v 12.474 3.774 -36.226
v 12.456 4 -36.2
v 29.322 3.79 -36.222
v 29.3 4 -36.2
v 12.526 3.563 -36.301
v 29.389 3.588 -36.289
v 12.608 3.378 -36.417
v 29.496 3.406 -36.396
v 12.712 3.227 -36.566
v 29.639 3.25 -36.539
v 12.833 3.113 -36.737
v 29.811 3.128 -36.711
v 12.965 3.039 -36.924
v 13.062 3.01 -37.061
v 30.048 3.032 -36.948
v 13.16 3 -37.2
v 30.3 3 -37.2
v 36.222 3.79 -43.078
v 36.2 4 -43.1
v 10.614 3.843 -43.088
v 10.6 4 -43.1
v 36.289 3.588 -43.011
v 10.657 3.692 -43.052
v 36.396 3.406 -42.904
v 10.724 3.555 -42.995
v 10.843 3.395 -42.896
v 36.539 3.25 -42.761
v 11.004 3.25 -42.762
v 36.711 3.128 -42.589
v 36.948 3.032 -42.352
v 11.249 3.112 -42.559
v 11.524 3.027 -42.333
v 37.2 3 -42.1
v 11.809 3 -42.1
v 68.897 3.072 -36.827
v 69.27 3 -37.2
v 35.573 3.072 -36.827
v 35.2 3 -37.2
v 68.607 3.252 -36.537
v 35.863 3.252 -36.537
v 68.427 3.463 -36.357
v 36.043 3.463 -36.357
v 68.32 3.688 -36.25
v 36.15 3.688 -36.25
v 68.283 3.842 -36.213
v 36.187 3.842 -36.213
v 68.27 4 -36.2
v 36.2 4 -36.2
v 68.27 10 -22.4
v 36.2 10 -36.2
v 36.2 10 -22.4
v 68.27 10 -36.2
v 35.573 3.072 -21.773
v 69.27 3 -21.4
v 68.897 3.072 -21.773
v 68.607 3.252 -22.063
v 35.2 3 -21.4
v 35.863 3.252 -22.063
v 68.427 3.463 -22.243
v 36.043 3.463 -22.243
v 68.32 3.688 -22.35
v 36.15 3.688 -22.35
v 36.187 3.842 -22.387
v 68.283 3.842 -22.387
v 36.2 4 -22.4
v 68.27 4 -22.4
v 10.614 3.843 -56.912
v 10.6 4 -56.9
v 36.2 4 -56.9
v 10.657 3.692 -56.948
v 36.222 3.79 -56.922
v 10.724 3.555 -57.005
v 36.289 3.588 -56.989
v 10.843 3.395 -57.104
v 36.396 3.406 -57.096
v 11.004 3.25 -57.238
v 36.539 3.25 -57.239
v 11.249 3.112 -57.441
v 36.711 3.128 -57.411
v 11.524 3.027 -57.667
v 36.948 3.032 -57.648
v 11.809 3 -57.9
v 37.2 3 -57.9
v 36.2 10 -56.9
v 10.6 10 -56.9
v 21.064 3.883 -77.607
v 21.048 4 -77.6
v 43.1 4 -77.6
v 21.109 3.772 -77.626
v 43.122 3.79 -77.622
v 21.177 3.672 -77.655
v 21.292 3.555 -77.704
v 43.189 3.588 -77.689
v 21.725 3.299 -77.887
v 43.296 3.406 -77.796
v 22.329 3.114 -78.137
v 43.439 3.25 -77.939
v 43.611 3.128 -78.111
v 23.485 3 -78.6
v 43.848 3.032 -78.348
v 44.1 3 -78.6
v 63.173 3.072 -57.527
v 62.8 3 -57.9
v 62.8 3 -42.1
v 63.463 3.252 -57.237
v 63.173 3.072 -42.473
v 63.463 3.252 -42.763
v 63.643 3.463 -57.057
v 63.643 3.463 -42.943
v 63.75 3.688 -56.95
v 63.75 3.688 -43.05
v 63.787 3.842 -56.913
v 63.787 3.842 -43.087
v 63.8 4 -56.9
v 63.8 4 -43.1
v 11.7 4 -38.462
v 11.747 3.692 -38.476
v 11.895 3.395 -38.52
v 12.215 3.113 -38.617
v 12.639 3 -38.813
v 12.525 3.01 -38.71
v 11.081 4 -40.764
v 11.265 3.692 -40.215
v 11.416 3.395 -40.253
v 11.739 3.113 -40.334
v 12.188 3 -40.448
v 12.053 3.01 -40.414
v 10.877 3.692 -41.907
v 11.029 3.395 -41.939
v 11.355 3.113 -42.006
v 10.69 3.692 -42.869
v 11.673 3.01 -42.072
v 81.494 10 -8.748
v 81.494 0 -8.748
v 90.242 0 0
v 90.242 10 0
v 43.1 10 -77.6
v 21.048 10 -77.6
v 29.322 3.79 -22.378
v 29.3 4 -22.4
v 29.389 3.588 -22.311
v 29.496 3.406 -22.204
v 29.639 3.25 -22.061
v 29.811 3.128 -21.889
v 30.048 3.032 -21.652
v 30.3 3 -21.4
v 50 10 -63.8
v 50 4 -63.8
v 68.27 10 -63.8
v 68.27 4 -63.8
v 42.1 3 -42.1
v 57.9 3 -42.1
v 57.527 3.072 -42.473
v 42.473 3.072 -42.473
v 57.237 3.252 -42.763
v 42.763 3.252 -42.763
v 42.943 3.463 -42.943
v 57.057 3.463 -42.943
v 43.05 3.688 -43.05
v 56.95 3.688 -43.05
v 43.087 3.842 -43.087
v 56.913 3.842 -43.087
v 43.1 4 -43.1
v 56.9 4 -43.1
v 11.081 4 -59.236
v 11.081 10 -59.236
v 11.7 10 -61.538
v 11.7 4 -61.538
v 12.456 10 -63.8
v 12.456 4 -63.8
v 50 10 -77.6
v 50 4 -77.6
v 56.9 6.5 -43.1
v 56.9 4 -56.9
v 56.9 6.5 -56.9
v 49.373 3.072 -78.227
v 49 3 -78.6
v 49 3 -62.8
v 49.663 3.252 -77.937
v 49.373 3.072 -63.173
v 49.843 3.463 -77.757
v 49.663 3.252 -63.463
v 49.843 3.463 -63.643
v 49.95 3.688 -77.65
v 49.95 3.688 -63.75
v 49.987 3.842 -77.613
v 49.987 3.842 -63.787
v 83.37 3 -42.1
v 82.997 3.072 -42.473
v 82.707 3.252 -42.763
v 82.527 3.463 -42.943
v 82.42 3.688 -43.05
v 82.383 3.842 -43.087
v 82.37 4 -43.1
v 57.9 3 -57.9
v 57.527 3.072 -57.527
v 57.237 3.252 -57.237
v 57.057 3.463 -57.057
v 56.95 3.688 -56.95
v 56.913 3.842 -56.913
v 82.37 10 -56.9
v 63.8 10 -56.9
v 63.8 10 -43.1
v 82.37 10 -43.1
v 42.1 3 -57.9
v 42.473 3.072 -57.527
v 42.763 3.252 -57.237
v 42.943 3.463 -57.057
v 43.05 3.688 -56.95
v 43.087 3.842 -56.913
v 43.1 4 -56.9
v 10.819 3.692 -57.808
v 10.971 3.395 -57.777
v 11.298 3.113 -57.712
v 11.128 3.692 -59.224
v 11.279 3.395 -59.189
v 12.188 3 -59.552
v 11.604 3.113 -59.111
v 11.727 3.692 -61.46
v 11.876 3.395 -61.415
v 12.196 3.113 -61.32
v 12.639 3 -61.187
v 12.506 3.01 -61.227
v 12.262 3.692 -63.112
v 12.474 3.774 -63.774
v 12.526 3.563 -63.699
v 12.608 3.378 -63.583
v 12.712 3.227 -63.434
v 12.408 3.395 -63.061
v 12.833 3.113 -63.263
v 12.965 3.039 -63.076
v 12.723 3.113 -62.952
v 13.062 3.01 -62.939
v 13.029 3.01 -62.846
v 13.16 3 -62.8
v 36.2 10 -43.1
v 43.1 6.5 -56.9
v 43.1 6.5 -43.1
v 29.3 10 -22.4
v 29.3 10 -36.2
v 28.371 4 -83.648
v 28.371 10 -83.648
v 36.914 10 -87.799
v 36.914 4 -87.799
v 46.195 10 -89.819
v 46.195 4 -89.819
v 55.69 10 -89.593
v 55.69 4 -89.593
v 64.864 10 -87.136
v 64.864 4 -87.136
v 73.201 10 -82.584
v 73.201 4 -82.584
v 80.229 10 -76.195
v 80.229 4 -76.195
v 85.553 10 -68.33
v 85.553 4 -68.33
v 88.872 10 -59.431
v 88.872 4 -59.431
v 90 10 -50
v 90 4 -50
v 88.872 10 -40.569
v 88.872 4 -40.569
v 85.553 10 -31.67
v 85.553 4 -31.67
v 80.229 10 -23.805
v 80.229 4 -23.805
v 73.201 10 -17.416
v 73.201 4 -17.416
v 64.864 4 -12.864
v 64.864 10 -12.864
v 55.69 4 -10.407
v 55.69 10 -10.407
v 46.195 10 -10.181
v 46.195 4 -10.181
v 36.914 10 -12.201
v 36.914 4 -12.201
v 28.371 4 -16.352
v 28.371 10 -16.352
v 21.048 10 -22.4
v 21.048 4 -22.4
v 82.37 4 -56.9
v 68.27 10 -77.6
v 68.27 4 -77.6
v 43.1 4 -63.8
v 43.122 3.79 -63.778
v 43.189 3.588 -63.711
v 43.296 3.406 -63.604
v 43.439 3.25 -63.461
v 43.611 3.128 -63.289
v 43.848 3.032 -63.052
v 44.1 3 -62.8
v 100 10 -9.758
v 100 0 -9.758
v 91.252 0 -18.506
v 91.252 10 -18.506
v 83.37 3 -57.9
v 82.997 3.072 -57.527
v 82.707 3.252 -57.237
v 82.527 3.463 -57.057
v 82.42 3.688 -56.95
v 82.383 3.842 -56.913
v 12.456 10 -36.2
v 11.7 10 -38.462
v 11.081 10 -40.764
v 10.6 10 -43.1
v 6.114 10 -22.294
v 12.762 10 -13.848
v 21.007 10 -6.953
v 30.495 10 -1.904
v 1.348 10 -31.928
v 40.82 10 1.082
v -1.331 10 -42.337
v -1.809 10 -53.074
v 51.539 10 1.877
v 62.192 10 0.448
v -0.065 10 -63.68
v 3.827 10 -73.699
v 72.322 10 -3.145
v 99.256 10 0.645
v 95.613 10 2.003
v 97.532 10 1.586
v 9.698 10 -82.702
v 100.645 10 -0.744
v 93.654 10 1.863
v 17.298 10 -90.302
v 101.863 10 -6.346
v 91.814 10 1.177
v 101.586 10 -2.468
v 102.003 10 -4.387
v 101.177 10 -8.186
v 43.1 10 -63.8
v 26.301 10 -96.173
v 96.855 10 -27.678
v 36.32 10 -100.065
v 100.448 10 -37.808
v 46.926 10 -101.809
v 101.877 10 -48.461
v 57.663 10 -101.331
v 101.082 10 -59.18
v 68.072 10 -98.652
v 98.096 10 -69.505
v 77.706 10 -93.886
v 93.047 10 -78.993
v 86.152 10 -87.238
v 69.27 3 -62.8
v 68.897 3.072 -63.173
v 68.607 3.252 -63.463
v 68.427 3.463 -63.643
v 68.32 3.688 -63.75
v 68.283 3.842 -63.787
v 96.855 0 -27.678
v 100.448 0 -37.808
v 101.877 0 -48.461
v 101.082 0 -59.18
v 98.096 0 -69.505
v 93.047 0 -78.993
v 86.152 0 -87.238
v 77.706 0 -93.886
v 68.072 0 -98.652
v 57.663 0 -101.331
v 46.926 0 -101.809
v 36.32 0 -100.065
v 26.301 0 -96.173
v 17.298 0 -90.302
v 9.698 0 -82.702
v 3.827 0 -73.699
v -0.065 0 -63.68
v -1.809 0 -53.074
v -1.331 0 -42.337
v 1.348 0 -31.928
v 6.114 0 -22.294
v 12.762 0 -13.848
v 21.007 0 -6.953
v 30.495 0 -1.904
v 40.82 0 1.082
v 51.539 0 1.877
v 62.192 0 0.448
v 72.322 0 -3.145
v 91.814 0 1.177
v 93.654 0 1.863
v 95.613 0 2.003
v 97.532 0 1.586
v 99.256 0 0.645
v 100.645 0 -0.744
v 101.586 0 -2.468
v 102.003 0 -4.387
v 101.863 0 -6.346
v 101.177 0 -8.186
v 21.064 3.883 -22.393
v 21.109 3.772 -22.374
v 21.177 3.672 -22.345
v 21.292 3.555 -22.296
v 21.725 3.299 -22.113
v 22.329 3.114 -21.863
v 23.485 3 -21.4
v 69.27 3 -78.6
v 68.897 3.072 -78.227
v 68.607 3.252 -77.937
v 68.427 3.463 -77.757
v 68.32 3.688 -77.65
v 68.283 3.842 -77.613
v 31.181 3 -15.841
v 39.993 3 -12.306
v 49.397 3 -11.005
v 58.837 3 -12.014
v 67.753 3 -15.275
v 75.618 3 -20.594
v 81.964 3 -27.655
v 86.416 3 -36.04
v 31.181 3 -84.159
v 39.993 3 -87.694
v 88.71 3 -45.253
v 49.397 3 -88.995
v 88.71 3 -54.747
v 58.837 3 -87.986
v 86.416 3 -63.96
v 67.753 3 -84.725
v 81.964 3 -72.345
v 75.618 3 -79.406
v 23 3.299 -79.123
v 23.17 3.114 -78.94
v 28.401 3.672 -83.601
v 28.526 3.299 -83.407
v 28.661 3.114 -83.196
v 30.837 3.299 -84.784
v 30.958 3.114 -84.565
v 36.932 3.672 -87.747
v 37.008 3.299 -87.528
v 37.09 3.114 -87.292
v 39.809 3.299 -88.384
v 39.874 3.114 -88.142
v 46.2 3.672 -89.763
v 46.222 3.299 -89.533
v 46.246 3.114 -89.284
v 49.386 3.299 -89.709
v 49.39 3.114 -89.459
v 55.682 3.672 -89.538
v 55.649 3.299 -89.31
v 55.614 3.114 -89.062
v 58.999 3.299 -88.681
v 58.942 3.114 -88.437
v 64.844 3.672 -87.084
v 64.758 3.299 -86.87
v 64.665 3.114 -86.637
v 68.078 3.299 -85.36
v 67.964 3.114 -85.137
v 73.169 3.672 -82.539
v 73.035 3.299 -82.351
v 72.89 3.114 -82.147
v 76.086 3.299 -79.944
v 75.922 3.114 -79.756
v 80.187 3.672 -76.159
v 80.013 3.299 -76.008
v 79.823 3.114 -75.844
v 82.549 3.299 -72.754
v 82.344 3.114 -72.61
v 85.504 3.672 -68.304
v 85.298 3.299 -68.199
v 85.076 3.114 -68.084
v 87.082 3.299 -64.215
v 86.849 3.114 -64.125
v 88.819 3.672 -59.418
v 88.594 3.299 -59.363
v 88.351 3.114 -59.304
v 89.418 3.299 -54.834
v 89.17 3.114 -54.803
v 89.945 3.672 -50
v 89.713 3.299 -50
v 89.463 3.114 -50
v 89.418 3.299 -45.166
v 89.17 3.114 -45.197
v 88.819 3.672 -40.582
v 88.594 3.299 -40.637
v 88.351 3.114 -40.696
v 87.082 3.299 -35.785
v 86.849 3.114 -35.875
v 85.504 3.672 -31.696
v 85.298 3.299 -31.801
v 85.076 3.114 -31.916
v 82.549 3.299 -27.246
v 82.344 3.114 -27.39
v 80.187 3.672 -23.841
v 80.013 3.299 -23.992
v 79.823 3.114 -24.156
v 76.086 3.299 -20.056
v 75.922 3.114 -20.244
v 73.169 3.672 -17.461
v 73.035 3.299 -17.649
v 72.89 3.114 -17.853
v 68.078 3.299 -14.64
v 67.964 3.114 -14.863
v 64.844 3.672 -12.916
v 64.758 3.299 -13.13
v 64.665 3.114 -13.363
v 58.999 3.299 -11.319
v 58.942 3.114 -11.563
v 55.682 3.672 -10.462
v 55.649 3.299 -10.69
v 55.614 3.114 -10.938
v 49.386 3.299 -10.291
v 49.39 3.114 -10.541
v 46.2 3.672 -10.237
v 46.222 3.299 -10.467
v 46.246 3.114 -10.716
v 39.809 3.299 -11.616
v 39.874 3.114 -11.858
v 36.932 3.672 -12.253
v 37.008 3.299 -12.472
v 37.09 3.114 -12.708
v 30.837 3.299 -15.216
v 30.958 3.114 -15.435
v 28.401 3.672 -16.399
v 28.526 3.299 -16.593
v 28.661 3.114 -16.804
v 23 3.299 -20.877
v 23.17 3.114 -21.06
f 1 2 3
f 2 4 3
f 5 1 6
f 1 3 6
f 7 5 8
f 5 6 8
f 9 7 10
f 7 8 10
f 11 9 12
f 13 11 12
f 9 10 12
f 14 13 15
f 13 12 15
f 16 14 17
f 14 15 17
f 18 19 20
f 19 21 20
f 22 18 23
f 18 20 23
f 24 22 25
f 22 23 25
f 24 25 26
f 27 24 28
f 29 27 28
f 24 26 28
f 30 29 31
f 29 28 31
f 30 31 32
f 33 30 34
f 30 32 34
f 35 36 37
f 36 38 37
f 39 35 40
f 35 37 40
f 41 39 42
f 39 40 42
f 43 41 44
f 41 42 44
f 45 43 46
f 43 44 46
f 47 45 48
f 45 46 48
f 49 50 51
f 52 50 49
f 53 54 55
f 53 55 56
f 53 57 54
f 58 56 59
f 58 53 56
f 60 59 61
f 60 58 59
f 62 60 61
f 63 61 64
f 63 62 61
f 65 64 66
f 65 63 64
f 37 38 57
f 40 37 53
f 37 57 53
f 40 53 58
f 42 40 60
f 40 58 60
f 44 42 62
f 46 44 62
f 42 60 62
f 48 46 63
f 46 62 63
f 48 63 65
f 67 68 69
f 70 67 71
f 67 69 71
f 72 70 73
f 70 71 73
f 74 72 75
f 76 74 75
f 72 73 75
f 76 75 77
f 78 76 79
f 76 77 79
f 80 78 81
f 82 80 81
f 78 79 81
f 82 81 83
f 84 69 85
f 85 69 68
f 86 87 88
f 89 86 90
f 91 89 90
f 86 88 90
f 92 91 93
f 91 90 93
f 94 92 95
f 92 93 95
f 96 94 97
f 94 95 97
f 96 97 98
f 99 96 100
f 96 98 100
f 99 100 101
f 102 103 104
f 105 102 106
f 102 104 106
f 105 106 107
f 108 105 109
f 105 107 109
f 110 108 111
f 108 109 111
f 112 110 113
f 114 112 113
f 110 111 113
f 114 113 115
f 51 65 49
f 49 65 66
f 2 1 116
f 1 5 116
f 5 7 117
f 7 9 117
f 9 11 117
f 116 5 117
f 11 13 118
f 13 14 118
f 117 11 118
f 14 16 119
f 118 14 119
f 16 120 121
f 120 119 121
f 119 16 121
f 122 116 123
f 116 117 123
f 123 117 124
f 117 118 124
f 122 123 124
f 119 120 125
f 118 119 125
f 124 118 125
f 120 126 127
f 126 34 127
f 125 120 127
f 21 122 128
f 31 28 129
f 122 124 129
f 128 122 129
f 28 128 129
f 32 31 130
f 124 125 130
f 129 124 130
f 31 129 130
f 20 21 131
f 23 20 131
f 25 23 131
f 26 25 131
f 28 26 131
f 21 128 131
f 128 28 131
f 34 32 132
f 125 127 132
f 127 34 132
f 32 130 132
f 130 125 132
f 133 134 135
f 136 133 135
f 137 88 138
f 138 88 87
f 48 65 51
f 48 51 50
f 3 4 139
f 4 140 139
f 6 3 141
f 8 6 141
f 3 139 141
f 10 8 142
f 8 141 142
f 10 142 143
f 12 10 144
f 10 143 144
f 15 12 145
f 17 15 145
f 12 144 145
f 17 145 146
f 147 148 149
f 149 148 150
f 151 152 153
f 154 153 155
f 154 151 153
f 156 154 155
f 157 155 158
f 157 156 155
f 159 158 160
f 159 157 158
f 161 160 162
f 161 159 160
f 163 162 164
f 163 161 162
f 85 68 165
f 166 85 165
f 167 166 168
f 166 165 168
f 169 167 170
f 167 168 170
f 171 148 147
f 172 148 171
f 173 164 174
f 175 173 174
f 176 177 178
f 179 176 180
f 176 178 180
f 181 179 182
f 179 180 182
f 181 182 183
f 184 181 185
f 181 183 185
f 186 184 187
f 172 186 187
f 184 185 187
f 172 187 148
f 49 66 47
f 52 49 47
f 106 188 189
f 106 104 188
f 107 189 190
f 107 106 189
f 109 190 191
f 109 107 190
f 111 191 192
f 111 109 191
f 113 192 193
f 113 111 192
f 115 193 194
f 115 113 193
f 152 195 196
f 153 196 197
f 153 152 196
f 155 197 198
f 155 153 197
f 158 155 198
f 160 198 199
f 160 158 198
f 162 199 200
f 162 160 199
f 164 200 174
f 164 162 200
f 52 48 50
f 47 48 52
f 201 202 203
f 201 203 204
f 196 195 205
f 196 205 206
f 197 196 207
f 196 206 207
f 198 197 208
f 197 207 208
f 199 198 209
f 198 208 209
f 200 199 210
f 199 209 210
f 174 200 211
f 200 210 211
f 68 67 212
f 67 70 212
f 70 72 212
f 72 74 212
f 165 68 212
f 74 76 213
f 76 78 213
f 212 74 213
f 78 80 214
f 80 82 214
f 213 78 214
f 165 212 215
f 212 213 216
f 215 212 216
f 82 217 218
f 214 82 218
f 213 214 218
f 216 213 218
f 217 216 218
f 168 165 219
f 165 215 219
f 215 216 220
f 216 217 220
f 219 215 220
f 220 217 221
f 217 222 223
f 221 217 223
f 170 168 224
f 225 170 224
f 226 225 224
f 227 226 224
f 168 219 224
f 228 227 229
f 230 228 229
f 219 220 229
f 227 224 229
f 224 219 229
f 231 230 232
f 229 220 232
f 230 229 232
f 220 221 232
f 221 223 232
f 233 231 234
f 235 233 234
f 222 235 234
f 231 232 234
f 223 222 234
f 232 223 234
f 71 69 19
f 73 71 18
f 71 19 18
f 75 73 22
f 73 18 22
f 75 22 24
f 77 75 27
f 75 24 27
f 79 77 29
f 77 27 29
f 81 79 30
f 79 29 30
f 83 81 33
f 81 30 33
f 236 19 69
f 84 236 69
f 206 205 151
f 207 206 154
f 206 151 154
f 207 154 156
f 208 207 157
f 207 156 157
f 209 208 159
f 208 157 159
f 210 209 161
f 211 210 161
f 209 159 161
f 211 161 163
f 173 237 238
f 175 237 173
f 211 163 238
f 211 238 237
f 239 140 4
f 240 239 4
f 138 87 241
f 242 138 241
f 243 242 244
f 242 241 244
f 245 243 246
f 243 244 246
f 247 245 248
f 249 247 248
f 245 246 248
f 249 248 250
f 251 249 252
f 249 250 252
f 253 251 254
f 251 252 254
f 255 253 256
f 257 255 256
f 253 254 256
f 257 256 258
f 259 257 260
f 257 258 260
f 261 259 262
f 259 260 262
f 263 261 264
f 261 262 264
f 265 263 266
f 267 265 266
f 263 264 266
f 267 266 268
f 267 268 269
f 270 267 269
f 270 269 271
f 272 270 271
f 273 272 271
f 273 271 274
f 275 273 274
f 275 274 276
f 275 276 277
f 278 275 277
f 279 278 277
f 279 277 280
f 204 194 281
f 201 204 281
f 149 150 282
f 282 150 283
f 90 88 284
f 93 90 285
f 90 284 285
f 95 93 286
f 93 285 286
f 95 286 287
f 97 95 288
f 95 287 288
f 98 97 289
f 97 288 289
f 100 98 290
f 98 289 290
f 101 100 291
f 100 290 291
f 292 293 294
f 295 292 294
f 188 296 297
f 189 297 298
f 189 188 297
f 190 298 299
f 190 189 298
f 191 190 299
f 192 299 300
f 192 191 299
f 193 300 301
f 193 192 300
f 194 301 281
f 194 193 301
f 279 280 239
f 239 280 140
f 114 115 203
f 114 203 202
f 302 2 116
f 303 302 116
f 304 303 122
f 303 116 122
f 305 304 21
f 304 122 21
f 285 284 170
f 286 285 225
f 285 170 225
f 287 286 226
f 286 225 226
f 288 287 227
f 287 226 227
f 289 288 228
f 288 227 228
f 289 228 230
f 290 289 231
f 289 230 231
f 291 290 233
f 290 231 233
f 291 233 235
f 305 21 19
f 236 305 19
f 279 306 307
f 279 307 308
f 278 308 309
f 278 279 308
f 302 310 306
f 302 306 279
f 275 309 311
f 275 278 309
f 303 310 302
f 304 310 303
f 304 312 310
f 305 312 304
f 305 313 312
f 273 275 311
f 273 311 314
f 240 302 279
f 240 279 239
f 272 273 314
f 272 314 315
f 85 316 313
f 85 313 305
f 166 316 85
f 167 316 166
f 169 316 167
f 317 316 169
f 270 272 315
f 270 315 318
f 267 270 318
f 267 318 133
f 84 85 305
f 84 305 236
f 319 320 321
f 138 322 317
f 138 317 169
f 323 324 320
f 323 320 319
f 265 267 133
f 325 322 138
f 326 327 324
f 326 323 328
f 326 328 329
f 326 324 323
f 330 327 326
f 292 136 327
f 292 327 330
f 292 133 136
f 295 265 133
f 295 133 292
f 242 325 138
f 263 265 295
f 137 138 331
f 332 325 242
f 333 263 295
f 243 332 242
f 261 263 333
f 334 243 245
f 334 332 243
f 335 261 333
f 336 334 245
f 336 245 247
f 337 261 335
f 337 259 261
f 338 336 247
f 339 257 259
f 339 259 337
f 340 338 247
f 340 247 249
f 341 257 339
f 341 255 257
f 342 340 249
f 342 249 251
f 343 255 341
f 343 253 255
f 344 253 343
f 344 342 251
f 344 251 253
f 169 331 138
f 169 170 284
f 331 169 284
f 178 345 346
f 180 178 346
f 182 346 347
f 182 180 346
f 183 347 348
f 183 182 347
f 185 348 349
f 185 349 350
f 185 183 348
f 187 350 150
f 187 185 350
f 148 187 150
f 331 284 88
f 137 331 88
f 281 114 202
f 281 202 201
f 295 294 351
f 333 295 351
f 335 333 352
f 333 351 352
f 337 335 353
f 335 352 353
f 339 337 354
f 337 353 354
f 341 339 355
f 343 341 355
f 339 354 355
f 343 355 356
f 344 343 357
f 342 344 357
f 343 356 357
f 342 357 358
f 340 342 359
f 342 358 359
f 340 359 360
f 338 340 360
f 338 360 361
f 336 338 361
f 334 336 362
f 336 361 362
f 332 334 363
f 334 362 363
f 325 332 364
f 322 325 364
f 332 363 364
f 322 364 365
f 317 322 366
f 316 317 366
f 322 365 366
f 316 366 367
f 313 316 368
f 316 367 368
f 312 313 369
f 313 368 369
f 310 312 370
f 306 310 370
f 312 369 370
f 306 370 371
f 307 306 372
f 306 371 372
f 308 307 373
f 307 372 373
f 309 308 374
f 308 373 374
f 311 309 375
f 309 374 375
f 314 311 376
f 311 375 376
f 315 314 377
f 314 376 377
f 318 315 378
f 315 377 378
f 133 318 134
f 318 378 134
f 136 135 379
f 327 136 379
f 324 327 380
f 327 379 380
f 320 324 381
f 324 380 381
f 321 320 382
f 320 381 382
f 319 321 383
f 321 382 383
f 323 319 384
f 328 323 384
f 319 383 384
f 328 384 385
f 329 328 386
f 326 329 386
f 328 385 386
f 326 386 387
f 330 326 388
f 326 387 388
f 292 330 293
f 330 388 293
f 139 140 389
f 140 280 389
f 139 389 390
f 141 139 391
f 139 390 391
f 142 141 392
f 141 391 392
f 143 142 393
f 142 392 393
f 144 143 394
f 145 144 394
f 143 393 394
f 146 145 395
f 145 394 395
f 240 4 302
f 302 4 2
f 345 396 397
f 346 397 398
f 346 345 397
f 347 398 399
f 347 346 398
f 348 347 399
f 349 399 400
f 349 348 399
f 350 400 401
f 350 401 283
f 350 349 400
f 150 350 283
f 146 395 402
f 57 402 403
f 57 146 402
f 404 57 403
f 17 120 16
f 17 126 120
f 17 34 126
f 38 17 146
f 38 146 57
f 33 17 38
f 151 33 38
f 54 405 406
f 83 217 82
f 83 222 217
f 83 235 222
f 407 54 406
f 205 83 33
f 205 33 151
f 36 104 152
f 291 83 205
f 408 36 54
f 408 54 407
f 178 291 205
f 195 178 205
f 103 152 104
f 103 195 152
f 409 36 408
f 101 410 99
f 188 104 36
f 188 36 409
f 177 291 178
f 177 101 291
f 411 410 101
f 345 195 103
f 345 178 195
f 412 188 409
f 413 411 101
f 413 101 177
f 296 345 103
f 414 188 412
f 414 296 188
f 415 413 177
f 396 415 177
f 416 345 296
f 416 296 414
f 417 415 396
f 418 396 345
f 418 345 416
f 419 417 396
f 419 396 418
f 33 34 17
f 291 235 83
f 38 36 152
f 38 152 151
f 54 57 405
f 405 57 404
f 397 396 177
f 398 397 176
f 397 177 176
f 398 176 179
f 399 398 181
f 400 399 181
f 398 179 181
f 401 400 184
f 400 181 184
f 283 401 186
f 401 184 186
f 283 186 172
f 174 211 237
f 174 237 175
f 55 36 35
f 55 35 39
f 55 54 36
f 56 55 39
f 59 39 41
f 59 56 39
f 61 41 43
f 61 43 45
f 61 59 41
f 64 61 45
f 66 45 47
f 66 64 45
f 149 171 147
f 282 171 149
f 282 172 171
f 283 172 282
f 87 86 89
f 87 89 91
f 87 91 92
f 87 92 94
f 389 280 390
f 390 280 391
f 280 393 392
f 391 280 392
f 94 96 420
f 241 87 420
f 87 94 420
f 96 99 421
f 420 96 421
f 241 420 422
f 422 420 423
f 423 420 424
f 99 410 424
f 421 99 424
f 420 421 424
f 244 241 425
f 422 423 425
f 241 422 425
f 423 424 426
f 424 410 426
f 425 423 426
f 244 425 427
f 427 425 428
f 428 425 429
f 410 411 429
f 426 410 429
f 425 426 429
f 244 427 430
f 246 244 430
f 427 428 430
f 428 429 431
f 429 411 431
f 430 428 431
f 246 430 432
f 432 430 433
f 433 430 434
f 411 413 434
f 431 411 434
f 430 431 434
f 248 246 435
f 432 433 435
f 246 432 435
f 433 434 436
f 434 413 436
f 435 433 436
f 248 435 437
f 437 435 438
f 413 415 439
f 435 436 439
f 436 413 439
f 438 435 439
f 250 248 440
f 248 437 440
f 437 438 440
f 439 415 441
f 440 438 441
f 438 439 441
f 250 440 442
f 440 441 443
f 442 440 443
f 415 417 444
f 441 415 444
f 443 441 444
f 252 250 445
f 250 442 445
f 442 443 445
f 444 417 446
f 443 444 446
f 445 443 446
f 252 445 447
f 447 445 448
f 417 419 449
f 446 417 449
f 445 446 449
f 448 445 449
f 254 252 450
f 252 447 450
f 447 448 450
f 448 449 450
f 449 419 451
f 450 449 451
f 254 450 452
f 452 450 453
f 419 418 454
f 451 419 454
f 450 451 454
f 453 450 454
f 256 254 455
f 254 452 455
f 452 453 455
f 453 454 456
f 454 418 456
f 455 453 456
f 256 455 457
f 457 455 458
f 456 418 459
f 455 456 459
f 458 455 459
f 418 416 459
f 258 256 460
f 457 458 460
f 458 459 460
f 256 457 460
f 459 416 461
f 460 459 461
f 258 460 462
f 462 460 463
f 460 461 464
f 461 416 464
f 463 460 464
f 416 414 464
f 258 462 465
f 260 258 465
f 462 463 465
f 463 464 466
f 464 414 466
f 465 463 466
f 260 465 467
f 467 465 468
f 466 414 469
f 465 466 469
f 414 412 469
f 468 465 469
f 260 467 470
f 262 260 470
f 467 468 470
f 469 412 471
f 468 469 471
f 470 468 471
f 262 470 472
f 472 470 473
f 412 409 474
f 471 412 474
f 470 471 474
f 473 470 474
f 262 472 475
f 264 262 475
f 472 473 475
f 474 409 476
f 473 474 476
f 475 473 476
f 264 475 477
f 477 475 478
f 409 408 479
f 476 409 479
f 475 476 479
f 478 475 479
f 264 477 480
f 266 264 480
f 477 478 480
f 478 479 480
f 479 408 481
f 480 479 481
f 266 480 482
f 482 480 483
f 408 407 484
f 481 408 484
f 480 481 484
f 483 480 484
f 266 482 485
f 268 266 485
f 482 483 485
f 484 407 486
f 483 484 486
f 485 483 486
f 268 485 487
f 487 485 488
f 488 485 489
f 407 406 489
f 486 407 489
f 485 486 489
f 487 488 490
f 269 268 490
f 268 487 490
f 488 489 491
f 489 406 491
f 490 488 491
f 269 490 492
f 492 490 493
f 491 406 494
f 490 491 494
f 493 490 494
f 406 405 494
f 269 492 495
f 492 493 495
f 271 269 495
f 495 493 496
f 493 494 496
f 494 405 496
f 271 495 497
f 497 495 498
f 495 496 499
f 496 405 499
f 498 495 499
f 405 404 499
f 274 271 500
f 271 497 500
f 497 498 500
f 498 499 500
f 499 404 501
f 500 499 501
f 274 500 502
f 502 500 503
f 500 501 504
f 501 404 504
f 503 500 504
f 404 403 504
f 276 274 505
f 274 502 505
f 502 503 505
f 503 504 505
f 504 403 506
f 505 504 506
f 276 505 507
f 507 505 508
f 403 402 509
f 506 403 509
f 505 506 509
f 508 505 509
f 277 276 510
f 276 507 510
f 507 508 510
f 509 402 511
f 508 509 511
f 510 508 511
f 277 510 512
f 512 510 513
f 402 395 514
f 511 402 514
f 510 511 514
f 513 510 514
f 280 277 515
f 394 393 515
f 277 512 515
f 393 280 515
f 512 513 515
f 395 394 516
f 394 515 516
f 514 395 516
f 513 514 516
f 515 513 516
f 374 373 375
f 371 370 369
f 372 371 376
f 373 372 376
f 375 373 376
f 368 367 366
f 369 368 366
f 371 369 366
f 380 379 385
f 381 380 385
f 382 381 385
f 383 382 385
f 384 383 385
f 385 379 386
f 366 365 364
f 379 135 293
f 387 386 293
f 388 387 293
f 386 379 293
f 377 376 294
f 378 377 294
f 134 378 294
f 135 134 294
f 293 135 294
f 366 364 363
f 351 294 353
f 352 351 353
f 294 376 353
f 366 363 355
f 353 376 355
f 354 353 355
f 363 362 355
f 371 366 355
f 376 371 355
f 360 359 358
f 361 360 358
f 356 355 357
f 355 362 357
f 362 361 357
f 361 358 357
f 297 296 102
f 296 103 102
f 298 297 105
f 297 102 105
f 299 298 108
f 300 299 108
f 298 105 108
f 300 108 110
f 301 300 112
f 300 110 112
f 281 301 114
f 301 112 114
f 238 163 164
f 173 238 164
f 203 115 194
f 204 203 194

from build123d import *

# Parameters (mm, degrees)
BOSS_EXTRUDE12_DEPTH = 3
SKETCH1_16_W         = 18.27
SKETCH1_16_H         = 13.8
SKETCH1_16_W_2       = 18.57
SKETCH1_16_W_3       = 32.07
BOSS_EXTRUDE13_DEPTH = 10
SKETCH1_17_W         = 13.8
SKETCH1_17_H         = 13.8
BOSS_EXTRUDE14_DEPTH = 6.5
FILLET1_R            = 1


with BuildPart() as part:
    # Sketch1 → Boss-Extrude12 (new body)
    with BuildSketch(Plane(origin=(0, 0, 0), x_dir=(1, 0, 0), z_dir=(0, 1, 0))):
        with BuildLine():
            Line((81.494030169, 8.747896251), (90.24192642, 0))
            ThreePointArc((90.24192642, 0), (100, 0), (100, 9.75807358))
            Line((100, 9.75807358), (91.252103749, 18.505969831))
            ThreePointArc((91.252103749, 18.505969831), (13.301158056, 86.698841944), (81.494030169, 8.747896251))
        make_face()
    extrude(amount=BOSS_EXTRUDE12_DEPTH)

    # Sketch1<16> → Boss-Extrude13 (add)
    # profile 1 of 4: a face of its own
    with BuildSketch(Plane(origin=(0, 0, 0), x_dir=(1, 0, 0), z_dir=(0, 1, 0))):
        with BuildLine():
            Line((81.494030169, 8.747896251), (90.24192642, 0))
            ThreePointArc((90.24192642, 0), (100, 0), (100, 9.75807358))
            Line((100, 9.75807358), (91.252103749, 18.505969831))
            ThreePointArc((91.252103749, 18.505969831), (13.301158056, 86.698841944), (81.494030169, 8.747896251))
        make_face()
        with BuildLine():
            Line((21.047625313, 22.4), (29.3, 22.4))
            Line((29.3, 22.4), (29.3, 36.2))
            Line((29.3, 36.2), (12.455892606, 36.2))
            ThreePointArc((12.455892606, 36.2), (11.37337625, 39.608467983), (10.599619291, 43.1))
            Line((10.599619291, 43.1), (36.2, 43.1))
            Line((36.2, 43.1), (36.2, 56.9))
            Line((36.2, 56.9), (10.599619291, 56.9))
            ThreePointArc((10.599619291, 56.9), (11.37337625, 60.391532017), (12.455892606, 63.8))
            Line((12.455892606, 63.8), (43.1, 63.8))
            Line((43.1, 63.8), (43.1, 77.6))
            Line((43.1, 77.6), (21.047625313, 77.6))
            ThreePointArc((21.047625313, 77.6), (90, 50), (21.047625313, 22.4))
        make_face(mode=Mode.SUBTRACT)
    # profile 2 of 4: a face of its own
    with BuildSketch(Plane(origin=(0, 0, 0), x_dir=(1, 0, 0), z_dir=(0, 1, 0))):
        with Locations((59.135, 70.7)):
            Rectangle(SKETCH1_16_W, SKETCH1_16_H)
    # profile 3 of 4: a face of its own
    with BuildSketch(Plane(origin=(0, 0, 0), x_dir=(1, 0, 0), z_dir=(0, 1, 0))):
        with Locations((73.085, 50)):
            Rectangle(SKETCH1_16_W_2, SKETCH1_16_H)
    # profile 4 of 4: a face of its own
    with BuildSketch(Plane(origin=(0, 0, 0), x_dir=(1, 0, 0), z_dir=(0, 1, 0))):
        with Locations((52.235, 29.3)):
            Rectangle(SKETCH1_16_W_3, SKETCH1_16_H)
    extrude(amount=BOSS_EXTRUDE13_DEPTH)

    # Sketch1<17> → Boss-Extrude14 (add)
    with BuildSketch(Plane(origin=(0, 0, 0), x_dir=(1, 0, 0), z_dir=(0, 1, 0))):
        with Locations((50, 50)):
            Rectangle(SKETCH1_17_W, SKETCH1_17_H)
    extrude(amount=BOSS_EXTRUDE14_DEPTH)

    # Fillet1
    fillet1_edges = [part.edges().sort_by_distance(p)[0] for p in [
        (90, 3, -50),
        (36.2, 3, -29.3),
        (52.235, 3, -22.4),
        (50, 3, -70.7),
        (59.135, 3, -63.8),
        (43.1, 3, -50),
        (50, 3, -43.1),
        (63.8, 3, -50),
        (73.085, 3, -43.1),
        (50, 3, -56.9),
        (73.085, 3, -56.9),
        (56.9, 3, -50),
        (52.235, 3, -36.2),
        (68.27, 3, -29.3),
        (82.37, 3, -50),
        (68.27, 3, -70.7),
        (59.135, 3, -77.6),
        (32.073812657, 3, -77.6),
        (43.1, 3, -70.7),
        (27.777946303, 3, -63.8),
        (11.37337625, 3, -60.391532017),
        (23.399809646, 3, -56.9),
        (36.2, 3, -50),
        (23.399809646, 3, -43.1),
        (11.37337625, 3, -39.608467983),
        (20.877946303, 3, -36.2),
        (29.3, 3, -29.3),
        (25.173812657, 3, -22.4),
    ]]
    fillet(fillet1_edges, radius=FILLET1_R)


solid = part.part
